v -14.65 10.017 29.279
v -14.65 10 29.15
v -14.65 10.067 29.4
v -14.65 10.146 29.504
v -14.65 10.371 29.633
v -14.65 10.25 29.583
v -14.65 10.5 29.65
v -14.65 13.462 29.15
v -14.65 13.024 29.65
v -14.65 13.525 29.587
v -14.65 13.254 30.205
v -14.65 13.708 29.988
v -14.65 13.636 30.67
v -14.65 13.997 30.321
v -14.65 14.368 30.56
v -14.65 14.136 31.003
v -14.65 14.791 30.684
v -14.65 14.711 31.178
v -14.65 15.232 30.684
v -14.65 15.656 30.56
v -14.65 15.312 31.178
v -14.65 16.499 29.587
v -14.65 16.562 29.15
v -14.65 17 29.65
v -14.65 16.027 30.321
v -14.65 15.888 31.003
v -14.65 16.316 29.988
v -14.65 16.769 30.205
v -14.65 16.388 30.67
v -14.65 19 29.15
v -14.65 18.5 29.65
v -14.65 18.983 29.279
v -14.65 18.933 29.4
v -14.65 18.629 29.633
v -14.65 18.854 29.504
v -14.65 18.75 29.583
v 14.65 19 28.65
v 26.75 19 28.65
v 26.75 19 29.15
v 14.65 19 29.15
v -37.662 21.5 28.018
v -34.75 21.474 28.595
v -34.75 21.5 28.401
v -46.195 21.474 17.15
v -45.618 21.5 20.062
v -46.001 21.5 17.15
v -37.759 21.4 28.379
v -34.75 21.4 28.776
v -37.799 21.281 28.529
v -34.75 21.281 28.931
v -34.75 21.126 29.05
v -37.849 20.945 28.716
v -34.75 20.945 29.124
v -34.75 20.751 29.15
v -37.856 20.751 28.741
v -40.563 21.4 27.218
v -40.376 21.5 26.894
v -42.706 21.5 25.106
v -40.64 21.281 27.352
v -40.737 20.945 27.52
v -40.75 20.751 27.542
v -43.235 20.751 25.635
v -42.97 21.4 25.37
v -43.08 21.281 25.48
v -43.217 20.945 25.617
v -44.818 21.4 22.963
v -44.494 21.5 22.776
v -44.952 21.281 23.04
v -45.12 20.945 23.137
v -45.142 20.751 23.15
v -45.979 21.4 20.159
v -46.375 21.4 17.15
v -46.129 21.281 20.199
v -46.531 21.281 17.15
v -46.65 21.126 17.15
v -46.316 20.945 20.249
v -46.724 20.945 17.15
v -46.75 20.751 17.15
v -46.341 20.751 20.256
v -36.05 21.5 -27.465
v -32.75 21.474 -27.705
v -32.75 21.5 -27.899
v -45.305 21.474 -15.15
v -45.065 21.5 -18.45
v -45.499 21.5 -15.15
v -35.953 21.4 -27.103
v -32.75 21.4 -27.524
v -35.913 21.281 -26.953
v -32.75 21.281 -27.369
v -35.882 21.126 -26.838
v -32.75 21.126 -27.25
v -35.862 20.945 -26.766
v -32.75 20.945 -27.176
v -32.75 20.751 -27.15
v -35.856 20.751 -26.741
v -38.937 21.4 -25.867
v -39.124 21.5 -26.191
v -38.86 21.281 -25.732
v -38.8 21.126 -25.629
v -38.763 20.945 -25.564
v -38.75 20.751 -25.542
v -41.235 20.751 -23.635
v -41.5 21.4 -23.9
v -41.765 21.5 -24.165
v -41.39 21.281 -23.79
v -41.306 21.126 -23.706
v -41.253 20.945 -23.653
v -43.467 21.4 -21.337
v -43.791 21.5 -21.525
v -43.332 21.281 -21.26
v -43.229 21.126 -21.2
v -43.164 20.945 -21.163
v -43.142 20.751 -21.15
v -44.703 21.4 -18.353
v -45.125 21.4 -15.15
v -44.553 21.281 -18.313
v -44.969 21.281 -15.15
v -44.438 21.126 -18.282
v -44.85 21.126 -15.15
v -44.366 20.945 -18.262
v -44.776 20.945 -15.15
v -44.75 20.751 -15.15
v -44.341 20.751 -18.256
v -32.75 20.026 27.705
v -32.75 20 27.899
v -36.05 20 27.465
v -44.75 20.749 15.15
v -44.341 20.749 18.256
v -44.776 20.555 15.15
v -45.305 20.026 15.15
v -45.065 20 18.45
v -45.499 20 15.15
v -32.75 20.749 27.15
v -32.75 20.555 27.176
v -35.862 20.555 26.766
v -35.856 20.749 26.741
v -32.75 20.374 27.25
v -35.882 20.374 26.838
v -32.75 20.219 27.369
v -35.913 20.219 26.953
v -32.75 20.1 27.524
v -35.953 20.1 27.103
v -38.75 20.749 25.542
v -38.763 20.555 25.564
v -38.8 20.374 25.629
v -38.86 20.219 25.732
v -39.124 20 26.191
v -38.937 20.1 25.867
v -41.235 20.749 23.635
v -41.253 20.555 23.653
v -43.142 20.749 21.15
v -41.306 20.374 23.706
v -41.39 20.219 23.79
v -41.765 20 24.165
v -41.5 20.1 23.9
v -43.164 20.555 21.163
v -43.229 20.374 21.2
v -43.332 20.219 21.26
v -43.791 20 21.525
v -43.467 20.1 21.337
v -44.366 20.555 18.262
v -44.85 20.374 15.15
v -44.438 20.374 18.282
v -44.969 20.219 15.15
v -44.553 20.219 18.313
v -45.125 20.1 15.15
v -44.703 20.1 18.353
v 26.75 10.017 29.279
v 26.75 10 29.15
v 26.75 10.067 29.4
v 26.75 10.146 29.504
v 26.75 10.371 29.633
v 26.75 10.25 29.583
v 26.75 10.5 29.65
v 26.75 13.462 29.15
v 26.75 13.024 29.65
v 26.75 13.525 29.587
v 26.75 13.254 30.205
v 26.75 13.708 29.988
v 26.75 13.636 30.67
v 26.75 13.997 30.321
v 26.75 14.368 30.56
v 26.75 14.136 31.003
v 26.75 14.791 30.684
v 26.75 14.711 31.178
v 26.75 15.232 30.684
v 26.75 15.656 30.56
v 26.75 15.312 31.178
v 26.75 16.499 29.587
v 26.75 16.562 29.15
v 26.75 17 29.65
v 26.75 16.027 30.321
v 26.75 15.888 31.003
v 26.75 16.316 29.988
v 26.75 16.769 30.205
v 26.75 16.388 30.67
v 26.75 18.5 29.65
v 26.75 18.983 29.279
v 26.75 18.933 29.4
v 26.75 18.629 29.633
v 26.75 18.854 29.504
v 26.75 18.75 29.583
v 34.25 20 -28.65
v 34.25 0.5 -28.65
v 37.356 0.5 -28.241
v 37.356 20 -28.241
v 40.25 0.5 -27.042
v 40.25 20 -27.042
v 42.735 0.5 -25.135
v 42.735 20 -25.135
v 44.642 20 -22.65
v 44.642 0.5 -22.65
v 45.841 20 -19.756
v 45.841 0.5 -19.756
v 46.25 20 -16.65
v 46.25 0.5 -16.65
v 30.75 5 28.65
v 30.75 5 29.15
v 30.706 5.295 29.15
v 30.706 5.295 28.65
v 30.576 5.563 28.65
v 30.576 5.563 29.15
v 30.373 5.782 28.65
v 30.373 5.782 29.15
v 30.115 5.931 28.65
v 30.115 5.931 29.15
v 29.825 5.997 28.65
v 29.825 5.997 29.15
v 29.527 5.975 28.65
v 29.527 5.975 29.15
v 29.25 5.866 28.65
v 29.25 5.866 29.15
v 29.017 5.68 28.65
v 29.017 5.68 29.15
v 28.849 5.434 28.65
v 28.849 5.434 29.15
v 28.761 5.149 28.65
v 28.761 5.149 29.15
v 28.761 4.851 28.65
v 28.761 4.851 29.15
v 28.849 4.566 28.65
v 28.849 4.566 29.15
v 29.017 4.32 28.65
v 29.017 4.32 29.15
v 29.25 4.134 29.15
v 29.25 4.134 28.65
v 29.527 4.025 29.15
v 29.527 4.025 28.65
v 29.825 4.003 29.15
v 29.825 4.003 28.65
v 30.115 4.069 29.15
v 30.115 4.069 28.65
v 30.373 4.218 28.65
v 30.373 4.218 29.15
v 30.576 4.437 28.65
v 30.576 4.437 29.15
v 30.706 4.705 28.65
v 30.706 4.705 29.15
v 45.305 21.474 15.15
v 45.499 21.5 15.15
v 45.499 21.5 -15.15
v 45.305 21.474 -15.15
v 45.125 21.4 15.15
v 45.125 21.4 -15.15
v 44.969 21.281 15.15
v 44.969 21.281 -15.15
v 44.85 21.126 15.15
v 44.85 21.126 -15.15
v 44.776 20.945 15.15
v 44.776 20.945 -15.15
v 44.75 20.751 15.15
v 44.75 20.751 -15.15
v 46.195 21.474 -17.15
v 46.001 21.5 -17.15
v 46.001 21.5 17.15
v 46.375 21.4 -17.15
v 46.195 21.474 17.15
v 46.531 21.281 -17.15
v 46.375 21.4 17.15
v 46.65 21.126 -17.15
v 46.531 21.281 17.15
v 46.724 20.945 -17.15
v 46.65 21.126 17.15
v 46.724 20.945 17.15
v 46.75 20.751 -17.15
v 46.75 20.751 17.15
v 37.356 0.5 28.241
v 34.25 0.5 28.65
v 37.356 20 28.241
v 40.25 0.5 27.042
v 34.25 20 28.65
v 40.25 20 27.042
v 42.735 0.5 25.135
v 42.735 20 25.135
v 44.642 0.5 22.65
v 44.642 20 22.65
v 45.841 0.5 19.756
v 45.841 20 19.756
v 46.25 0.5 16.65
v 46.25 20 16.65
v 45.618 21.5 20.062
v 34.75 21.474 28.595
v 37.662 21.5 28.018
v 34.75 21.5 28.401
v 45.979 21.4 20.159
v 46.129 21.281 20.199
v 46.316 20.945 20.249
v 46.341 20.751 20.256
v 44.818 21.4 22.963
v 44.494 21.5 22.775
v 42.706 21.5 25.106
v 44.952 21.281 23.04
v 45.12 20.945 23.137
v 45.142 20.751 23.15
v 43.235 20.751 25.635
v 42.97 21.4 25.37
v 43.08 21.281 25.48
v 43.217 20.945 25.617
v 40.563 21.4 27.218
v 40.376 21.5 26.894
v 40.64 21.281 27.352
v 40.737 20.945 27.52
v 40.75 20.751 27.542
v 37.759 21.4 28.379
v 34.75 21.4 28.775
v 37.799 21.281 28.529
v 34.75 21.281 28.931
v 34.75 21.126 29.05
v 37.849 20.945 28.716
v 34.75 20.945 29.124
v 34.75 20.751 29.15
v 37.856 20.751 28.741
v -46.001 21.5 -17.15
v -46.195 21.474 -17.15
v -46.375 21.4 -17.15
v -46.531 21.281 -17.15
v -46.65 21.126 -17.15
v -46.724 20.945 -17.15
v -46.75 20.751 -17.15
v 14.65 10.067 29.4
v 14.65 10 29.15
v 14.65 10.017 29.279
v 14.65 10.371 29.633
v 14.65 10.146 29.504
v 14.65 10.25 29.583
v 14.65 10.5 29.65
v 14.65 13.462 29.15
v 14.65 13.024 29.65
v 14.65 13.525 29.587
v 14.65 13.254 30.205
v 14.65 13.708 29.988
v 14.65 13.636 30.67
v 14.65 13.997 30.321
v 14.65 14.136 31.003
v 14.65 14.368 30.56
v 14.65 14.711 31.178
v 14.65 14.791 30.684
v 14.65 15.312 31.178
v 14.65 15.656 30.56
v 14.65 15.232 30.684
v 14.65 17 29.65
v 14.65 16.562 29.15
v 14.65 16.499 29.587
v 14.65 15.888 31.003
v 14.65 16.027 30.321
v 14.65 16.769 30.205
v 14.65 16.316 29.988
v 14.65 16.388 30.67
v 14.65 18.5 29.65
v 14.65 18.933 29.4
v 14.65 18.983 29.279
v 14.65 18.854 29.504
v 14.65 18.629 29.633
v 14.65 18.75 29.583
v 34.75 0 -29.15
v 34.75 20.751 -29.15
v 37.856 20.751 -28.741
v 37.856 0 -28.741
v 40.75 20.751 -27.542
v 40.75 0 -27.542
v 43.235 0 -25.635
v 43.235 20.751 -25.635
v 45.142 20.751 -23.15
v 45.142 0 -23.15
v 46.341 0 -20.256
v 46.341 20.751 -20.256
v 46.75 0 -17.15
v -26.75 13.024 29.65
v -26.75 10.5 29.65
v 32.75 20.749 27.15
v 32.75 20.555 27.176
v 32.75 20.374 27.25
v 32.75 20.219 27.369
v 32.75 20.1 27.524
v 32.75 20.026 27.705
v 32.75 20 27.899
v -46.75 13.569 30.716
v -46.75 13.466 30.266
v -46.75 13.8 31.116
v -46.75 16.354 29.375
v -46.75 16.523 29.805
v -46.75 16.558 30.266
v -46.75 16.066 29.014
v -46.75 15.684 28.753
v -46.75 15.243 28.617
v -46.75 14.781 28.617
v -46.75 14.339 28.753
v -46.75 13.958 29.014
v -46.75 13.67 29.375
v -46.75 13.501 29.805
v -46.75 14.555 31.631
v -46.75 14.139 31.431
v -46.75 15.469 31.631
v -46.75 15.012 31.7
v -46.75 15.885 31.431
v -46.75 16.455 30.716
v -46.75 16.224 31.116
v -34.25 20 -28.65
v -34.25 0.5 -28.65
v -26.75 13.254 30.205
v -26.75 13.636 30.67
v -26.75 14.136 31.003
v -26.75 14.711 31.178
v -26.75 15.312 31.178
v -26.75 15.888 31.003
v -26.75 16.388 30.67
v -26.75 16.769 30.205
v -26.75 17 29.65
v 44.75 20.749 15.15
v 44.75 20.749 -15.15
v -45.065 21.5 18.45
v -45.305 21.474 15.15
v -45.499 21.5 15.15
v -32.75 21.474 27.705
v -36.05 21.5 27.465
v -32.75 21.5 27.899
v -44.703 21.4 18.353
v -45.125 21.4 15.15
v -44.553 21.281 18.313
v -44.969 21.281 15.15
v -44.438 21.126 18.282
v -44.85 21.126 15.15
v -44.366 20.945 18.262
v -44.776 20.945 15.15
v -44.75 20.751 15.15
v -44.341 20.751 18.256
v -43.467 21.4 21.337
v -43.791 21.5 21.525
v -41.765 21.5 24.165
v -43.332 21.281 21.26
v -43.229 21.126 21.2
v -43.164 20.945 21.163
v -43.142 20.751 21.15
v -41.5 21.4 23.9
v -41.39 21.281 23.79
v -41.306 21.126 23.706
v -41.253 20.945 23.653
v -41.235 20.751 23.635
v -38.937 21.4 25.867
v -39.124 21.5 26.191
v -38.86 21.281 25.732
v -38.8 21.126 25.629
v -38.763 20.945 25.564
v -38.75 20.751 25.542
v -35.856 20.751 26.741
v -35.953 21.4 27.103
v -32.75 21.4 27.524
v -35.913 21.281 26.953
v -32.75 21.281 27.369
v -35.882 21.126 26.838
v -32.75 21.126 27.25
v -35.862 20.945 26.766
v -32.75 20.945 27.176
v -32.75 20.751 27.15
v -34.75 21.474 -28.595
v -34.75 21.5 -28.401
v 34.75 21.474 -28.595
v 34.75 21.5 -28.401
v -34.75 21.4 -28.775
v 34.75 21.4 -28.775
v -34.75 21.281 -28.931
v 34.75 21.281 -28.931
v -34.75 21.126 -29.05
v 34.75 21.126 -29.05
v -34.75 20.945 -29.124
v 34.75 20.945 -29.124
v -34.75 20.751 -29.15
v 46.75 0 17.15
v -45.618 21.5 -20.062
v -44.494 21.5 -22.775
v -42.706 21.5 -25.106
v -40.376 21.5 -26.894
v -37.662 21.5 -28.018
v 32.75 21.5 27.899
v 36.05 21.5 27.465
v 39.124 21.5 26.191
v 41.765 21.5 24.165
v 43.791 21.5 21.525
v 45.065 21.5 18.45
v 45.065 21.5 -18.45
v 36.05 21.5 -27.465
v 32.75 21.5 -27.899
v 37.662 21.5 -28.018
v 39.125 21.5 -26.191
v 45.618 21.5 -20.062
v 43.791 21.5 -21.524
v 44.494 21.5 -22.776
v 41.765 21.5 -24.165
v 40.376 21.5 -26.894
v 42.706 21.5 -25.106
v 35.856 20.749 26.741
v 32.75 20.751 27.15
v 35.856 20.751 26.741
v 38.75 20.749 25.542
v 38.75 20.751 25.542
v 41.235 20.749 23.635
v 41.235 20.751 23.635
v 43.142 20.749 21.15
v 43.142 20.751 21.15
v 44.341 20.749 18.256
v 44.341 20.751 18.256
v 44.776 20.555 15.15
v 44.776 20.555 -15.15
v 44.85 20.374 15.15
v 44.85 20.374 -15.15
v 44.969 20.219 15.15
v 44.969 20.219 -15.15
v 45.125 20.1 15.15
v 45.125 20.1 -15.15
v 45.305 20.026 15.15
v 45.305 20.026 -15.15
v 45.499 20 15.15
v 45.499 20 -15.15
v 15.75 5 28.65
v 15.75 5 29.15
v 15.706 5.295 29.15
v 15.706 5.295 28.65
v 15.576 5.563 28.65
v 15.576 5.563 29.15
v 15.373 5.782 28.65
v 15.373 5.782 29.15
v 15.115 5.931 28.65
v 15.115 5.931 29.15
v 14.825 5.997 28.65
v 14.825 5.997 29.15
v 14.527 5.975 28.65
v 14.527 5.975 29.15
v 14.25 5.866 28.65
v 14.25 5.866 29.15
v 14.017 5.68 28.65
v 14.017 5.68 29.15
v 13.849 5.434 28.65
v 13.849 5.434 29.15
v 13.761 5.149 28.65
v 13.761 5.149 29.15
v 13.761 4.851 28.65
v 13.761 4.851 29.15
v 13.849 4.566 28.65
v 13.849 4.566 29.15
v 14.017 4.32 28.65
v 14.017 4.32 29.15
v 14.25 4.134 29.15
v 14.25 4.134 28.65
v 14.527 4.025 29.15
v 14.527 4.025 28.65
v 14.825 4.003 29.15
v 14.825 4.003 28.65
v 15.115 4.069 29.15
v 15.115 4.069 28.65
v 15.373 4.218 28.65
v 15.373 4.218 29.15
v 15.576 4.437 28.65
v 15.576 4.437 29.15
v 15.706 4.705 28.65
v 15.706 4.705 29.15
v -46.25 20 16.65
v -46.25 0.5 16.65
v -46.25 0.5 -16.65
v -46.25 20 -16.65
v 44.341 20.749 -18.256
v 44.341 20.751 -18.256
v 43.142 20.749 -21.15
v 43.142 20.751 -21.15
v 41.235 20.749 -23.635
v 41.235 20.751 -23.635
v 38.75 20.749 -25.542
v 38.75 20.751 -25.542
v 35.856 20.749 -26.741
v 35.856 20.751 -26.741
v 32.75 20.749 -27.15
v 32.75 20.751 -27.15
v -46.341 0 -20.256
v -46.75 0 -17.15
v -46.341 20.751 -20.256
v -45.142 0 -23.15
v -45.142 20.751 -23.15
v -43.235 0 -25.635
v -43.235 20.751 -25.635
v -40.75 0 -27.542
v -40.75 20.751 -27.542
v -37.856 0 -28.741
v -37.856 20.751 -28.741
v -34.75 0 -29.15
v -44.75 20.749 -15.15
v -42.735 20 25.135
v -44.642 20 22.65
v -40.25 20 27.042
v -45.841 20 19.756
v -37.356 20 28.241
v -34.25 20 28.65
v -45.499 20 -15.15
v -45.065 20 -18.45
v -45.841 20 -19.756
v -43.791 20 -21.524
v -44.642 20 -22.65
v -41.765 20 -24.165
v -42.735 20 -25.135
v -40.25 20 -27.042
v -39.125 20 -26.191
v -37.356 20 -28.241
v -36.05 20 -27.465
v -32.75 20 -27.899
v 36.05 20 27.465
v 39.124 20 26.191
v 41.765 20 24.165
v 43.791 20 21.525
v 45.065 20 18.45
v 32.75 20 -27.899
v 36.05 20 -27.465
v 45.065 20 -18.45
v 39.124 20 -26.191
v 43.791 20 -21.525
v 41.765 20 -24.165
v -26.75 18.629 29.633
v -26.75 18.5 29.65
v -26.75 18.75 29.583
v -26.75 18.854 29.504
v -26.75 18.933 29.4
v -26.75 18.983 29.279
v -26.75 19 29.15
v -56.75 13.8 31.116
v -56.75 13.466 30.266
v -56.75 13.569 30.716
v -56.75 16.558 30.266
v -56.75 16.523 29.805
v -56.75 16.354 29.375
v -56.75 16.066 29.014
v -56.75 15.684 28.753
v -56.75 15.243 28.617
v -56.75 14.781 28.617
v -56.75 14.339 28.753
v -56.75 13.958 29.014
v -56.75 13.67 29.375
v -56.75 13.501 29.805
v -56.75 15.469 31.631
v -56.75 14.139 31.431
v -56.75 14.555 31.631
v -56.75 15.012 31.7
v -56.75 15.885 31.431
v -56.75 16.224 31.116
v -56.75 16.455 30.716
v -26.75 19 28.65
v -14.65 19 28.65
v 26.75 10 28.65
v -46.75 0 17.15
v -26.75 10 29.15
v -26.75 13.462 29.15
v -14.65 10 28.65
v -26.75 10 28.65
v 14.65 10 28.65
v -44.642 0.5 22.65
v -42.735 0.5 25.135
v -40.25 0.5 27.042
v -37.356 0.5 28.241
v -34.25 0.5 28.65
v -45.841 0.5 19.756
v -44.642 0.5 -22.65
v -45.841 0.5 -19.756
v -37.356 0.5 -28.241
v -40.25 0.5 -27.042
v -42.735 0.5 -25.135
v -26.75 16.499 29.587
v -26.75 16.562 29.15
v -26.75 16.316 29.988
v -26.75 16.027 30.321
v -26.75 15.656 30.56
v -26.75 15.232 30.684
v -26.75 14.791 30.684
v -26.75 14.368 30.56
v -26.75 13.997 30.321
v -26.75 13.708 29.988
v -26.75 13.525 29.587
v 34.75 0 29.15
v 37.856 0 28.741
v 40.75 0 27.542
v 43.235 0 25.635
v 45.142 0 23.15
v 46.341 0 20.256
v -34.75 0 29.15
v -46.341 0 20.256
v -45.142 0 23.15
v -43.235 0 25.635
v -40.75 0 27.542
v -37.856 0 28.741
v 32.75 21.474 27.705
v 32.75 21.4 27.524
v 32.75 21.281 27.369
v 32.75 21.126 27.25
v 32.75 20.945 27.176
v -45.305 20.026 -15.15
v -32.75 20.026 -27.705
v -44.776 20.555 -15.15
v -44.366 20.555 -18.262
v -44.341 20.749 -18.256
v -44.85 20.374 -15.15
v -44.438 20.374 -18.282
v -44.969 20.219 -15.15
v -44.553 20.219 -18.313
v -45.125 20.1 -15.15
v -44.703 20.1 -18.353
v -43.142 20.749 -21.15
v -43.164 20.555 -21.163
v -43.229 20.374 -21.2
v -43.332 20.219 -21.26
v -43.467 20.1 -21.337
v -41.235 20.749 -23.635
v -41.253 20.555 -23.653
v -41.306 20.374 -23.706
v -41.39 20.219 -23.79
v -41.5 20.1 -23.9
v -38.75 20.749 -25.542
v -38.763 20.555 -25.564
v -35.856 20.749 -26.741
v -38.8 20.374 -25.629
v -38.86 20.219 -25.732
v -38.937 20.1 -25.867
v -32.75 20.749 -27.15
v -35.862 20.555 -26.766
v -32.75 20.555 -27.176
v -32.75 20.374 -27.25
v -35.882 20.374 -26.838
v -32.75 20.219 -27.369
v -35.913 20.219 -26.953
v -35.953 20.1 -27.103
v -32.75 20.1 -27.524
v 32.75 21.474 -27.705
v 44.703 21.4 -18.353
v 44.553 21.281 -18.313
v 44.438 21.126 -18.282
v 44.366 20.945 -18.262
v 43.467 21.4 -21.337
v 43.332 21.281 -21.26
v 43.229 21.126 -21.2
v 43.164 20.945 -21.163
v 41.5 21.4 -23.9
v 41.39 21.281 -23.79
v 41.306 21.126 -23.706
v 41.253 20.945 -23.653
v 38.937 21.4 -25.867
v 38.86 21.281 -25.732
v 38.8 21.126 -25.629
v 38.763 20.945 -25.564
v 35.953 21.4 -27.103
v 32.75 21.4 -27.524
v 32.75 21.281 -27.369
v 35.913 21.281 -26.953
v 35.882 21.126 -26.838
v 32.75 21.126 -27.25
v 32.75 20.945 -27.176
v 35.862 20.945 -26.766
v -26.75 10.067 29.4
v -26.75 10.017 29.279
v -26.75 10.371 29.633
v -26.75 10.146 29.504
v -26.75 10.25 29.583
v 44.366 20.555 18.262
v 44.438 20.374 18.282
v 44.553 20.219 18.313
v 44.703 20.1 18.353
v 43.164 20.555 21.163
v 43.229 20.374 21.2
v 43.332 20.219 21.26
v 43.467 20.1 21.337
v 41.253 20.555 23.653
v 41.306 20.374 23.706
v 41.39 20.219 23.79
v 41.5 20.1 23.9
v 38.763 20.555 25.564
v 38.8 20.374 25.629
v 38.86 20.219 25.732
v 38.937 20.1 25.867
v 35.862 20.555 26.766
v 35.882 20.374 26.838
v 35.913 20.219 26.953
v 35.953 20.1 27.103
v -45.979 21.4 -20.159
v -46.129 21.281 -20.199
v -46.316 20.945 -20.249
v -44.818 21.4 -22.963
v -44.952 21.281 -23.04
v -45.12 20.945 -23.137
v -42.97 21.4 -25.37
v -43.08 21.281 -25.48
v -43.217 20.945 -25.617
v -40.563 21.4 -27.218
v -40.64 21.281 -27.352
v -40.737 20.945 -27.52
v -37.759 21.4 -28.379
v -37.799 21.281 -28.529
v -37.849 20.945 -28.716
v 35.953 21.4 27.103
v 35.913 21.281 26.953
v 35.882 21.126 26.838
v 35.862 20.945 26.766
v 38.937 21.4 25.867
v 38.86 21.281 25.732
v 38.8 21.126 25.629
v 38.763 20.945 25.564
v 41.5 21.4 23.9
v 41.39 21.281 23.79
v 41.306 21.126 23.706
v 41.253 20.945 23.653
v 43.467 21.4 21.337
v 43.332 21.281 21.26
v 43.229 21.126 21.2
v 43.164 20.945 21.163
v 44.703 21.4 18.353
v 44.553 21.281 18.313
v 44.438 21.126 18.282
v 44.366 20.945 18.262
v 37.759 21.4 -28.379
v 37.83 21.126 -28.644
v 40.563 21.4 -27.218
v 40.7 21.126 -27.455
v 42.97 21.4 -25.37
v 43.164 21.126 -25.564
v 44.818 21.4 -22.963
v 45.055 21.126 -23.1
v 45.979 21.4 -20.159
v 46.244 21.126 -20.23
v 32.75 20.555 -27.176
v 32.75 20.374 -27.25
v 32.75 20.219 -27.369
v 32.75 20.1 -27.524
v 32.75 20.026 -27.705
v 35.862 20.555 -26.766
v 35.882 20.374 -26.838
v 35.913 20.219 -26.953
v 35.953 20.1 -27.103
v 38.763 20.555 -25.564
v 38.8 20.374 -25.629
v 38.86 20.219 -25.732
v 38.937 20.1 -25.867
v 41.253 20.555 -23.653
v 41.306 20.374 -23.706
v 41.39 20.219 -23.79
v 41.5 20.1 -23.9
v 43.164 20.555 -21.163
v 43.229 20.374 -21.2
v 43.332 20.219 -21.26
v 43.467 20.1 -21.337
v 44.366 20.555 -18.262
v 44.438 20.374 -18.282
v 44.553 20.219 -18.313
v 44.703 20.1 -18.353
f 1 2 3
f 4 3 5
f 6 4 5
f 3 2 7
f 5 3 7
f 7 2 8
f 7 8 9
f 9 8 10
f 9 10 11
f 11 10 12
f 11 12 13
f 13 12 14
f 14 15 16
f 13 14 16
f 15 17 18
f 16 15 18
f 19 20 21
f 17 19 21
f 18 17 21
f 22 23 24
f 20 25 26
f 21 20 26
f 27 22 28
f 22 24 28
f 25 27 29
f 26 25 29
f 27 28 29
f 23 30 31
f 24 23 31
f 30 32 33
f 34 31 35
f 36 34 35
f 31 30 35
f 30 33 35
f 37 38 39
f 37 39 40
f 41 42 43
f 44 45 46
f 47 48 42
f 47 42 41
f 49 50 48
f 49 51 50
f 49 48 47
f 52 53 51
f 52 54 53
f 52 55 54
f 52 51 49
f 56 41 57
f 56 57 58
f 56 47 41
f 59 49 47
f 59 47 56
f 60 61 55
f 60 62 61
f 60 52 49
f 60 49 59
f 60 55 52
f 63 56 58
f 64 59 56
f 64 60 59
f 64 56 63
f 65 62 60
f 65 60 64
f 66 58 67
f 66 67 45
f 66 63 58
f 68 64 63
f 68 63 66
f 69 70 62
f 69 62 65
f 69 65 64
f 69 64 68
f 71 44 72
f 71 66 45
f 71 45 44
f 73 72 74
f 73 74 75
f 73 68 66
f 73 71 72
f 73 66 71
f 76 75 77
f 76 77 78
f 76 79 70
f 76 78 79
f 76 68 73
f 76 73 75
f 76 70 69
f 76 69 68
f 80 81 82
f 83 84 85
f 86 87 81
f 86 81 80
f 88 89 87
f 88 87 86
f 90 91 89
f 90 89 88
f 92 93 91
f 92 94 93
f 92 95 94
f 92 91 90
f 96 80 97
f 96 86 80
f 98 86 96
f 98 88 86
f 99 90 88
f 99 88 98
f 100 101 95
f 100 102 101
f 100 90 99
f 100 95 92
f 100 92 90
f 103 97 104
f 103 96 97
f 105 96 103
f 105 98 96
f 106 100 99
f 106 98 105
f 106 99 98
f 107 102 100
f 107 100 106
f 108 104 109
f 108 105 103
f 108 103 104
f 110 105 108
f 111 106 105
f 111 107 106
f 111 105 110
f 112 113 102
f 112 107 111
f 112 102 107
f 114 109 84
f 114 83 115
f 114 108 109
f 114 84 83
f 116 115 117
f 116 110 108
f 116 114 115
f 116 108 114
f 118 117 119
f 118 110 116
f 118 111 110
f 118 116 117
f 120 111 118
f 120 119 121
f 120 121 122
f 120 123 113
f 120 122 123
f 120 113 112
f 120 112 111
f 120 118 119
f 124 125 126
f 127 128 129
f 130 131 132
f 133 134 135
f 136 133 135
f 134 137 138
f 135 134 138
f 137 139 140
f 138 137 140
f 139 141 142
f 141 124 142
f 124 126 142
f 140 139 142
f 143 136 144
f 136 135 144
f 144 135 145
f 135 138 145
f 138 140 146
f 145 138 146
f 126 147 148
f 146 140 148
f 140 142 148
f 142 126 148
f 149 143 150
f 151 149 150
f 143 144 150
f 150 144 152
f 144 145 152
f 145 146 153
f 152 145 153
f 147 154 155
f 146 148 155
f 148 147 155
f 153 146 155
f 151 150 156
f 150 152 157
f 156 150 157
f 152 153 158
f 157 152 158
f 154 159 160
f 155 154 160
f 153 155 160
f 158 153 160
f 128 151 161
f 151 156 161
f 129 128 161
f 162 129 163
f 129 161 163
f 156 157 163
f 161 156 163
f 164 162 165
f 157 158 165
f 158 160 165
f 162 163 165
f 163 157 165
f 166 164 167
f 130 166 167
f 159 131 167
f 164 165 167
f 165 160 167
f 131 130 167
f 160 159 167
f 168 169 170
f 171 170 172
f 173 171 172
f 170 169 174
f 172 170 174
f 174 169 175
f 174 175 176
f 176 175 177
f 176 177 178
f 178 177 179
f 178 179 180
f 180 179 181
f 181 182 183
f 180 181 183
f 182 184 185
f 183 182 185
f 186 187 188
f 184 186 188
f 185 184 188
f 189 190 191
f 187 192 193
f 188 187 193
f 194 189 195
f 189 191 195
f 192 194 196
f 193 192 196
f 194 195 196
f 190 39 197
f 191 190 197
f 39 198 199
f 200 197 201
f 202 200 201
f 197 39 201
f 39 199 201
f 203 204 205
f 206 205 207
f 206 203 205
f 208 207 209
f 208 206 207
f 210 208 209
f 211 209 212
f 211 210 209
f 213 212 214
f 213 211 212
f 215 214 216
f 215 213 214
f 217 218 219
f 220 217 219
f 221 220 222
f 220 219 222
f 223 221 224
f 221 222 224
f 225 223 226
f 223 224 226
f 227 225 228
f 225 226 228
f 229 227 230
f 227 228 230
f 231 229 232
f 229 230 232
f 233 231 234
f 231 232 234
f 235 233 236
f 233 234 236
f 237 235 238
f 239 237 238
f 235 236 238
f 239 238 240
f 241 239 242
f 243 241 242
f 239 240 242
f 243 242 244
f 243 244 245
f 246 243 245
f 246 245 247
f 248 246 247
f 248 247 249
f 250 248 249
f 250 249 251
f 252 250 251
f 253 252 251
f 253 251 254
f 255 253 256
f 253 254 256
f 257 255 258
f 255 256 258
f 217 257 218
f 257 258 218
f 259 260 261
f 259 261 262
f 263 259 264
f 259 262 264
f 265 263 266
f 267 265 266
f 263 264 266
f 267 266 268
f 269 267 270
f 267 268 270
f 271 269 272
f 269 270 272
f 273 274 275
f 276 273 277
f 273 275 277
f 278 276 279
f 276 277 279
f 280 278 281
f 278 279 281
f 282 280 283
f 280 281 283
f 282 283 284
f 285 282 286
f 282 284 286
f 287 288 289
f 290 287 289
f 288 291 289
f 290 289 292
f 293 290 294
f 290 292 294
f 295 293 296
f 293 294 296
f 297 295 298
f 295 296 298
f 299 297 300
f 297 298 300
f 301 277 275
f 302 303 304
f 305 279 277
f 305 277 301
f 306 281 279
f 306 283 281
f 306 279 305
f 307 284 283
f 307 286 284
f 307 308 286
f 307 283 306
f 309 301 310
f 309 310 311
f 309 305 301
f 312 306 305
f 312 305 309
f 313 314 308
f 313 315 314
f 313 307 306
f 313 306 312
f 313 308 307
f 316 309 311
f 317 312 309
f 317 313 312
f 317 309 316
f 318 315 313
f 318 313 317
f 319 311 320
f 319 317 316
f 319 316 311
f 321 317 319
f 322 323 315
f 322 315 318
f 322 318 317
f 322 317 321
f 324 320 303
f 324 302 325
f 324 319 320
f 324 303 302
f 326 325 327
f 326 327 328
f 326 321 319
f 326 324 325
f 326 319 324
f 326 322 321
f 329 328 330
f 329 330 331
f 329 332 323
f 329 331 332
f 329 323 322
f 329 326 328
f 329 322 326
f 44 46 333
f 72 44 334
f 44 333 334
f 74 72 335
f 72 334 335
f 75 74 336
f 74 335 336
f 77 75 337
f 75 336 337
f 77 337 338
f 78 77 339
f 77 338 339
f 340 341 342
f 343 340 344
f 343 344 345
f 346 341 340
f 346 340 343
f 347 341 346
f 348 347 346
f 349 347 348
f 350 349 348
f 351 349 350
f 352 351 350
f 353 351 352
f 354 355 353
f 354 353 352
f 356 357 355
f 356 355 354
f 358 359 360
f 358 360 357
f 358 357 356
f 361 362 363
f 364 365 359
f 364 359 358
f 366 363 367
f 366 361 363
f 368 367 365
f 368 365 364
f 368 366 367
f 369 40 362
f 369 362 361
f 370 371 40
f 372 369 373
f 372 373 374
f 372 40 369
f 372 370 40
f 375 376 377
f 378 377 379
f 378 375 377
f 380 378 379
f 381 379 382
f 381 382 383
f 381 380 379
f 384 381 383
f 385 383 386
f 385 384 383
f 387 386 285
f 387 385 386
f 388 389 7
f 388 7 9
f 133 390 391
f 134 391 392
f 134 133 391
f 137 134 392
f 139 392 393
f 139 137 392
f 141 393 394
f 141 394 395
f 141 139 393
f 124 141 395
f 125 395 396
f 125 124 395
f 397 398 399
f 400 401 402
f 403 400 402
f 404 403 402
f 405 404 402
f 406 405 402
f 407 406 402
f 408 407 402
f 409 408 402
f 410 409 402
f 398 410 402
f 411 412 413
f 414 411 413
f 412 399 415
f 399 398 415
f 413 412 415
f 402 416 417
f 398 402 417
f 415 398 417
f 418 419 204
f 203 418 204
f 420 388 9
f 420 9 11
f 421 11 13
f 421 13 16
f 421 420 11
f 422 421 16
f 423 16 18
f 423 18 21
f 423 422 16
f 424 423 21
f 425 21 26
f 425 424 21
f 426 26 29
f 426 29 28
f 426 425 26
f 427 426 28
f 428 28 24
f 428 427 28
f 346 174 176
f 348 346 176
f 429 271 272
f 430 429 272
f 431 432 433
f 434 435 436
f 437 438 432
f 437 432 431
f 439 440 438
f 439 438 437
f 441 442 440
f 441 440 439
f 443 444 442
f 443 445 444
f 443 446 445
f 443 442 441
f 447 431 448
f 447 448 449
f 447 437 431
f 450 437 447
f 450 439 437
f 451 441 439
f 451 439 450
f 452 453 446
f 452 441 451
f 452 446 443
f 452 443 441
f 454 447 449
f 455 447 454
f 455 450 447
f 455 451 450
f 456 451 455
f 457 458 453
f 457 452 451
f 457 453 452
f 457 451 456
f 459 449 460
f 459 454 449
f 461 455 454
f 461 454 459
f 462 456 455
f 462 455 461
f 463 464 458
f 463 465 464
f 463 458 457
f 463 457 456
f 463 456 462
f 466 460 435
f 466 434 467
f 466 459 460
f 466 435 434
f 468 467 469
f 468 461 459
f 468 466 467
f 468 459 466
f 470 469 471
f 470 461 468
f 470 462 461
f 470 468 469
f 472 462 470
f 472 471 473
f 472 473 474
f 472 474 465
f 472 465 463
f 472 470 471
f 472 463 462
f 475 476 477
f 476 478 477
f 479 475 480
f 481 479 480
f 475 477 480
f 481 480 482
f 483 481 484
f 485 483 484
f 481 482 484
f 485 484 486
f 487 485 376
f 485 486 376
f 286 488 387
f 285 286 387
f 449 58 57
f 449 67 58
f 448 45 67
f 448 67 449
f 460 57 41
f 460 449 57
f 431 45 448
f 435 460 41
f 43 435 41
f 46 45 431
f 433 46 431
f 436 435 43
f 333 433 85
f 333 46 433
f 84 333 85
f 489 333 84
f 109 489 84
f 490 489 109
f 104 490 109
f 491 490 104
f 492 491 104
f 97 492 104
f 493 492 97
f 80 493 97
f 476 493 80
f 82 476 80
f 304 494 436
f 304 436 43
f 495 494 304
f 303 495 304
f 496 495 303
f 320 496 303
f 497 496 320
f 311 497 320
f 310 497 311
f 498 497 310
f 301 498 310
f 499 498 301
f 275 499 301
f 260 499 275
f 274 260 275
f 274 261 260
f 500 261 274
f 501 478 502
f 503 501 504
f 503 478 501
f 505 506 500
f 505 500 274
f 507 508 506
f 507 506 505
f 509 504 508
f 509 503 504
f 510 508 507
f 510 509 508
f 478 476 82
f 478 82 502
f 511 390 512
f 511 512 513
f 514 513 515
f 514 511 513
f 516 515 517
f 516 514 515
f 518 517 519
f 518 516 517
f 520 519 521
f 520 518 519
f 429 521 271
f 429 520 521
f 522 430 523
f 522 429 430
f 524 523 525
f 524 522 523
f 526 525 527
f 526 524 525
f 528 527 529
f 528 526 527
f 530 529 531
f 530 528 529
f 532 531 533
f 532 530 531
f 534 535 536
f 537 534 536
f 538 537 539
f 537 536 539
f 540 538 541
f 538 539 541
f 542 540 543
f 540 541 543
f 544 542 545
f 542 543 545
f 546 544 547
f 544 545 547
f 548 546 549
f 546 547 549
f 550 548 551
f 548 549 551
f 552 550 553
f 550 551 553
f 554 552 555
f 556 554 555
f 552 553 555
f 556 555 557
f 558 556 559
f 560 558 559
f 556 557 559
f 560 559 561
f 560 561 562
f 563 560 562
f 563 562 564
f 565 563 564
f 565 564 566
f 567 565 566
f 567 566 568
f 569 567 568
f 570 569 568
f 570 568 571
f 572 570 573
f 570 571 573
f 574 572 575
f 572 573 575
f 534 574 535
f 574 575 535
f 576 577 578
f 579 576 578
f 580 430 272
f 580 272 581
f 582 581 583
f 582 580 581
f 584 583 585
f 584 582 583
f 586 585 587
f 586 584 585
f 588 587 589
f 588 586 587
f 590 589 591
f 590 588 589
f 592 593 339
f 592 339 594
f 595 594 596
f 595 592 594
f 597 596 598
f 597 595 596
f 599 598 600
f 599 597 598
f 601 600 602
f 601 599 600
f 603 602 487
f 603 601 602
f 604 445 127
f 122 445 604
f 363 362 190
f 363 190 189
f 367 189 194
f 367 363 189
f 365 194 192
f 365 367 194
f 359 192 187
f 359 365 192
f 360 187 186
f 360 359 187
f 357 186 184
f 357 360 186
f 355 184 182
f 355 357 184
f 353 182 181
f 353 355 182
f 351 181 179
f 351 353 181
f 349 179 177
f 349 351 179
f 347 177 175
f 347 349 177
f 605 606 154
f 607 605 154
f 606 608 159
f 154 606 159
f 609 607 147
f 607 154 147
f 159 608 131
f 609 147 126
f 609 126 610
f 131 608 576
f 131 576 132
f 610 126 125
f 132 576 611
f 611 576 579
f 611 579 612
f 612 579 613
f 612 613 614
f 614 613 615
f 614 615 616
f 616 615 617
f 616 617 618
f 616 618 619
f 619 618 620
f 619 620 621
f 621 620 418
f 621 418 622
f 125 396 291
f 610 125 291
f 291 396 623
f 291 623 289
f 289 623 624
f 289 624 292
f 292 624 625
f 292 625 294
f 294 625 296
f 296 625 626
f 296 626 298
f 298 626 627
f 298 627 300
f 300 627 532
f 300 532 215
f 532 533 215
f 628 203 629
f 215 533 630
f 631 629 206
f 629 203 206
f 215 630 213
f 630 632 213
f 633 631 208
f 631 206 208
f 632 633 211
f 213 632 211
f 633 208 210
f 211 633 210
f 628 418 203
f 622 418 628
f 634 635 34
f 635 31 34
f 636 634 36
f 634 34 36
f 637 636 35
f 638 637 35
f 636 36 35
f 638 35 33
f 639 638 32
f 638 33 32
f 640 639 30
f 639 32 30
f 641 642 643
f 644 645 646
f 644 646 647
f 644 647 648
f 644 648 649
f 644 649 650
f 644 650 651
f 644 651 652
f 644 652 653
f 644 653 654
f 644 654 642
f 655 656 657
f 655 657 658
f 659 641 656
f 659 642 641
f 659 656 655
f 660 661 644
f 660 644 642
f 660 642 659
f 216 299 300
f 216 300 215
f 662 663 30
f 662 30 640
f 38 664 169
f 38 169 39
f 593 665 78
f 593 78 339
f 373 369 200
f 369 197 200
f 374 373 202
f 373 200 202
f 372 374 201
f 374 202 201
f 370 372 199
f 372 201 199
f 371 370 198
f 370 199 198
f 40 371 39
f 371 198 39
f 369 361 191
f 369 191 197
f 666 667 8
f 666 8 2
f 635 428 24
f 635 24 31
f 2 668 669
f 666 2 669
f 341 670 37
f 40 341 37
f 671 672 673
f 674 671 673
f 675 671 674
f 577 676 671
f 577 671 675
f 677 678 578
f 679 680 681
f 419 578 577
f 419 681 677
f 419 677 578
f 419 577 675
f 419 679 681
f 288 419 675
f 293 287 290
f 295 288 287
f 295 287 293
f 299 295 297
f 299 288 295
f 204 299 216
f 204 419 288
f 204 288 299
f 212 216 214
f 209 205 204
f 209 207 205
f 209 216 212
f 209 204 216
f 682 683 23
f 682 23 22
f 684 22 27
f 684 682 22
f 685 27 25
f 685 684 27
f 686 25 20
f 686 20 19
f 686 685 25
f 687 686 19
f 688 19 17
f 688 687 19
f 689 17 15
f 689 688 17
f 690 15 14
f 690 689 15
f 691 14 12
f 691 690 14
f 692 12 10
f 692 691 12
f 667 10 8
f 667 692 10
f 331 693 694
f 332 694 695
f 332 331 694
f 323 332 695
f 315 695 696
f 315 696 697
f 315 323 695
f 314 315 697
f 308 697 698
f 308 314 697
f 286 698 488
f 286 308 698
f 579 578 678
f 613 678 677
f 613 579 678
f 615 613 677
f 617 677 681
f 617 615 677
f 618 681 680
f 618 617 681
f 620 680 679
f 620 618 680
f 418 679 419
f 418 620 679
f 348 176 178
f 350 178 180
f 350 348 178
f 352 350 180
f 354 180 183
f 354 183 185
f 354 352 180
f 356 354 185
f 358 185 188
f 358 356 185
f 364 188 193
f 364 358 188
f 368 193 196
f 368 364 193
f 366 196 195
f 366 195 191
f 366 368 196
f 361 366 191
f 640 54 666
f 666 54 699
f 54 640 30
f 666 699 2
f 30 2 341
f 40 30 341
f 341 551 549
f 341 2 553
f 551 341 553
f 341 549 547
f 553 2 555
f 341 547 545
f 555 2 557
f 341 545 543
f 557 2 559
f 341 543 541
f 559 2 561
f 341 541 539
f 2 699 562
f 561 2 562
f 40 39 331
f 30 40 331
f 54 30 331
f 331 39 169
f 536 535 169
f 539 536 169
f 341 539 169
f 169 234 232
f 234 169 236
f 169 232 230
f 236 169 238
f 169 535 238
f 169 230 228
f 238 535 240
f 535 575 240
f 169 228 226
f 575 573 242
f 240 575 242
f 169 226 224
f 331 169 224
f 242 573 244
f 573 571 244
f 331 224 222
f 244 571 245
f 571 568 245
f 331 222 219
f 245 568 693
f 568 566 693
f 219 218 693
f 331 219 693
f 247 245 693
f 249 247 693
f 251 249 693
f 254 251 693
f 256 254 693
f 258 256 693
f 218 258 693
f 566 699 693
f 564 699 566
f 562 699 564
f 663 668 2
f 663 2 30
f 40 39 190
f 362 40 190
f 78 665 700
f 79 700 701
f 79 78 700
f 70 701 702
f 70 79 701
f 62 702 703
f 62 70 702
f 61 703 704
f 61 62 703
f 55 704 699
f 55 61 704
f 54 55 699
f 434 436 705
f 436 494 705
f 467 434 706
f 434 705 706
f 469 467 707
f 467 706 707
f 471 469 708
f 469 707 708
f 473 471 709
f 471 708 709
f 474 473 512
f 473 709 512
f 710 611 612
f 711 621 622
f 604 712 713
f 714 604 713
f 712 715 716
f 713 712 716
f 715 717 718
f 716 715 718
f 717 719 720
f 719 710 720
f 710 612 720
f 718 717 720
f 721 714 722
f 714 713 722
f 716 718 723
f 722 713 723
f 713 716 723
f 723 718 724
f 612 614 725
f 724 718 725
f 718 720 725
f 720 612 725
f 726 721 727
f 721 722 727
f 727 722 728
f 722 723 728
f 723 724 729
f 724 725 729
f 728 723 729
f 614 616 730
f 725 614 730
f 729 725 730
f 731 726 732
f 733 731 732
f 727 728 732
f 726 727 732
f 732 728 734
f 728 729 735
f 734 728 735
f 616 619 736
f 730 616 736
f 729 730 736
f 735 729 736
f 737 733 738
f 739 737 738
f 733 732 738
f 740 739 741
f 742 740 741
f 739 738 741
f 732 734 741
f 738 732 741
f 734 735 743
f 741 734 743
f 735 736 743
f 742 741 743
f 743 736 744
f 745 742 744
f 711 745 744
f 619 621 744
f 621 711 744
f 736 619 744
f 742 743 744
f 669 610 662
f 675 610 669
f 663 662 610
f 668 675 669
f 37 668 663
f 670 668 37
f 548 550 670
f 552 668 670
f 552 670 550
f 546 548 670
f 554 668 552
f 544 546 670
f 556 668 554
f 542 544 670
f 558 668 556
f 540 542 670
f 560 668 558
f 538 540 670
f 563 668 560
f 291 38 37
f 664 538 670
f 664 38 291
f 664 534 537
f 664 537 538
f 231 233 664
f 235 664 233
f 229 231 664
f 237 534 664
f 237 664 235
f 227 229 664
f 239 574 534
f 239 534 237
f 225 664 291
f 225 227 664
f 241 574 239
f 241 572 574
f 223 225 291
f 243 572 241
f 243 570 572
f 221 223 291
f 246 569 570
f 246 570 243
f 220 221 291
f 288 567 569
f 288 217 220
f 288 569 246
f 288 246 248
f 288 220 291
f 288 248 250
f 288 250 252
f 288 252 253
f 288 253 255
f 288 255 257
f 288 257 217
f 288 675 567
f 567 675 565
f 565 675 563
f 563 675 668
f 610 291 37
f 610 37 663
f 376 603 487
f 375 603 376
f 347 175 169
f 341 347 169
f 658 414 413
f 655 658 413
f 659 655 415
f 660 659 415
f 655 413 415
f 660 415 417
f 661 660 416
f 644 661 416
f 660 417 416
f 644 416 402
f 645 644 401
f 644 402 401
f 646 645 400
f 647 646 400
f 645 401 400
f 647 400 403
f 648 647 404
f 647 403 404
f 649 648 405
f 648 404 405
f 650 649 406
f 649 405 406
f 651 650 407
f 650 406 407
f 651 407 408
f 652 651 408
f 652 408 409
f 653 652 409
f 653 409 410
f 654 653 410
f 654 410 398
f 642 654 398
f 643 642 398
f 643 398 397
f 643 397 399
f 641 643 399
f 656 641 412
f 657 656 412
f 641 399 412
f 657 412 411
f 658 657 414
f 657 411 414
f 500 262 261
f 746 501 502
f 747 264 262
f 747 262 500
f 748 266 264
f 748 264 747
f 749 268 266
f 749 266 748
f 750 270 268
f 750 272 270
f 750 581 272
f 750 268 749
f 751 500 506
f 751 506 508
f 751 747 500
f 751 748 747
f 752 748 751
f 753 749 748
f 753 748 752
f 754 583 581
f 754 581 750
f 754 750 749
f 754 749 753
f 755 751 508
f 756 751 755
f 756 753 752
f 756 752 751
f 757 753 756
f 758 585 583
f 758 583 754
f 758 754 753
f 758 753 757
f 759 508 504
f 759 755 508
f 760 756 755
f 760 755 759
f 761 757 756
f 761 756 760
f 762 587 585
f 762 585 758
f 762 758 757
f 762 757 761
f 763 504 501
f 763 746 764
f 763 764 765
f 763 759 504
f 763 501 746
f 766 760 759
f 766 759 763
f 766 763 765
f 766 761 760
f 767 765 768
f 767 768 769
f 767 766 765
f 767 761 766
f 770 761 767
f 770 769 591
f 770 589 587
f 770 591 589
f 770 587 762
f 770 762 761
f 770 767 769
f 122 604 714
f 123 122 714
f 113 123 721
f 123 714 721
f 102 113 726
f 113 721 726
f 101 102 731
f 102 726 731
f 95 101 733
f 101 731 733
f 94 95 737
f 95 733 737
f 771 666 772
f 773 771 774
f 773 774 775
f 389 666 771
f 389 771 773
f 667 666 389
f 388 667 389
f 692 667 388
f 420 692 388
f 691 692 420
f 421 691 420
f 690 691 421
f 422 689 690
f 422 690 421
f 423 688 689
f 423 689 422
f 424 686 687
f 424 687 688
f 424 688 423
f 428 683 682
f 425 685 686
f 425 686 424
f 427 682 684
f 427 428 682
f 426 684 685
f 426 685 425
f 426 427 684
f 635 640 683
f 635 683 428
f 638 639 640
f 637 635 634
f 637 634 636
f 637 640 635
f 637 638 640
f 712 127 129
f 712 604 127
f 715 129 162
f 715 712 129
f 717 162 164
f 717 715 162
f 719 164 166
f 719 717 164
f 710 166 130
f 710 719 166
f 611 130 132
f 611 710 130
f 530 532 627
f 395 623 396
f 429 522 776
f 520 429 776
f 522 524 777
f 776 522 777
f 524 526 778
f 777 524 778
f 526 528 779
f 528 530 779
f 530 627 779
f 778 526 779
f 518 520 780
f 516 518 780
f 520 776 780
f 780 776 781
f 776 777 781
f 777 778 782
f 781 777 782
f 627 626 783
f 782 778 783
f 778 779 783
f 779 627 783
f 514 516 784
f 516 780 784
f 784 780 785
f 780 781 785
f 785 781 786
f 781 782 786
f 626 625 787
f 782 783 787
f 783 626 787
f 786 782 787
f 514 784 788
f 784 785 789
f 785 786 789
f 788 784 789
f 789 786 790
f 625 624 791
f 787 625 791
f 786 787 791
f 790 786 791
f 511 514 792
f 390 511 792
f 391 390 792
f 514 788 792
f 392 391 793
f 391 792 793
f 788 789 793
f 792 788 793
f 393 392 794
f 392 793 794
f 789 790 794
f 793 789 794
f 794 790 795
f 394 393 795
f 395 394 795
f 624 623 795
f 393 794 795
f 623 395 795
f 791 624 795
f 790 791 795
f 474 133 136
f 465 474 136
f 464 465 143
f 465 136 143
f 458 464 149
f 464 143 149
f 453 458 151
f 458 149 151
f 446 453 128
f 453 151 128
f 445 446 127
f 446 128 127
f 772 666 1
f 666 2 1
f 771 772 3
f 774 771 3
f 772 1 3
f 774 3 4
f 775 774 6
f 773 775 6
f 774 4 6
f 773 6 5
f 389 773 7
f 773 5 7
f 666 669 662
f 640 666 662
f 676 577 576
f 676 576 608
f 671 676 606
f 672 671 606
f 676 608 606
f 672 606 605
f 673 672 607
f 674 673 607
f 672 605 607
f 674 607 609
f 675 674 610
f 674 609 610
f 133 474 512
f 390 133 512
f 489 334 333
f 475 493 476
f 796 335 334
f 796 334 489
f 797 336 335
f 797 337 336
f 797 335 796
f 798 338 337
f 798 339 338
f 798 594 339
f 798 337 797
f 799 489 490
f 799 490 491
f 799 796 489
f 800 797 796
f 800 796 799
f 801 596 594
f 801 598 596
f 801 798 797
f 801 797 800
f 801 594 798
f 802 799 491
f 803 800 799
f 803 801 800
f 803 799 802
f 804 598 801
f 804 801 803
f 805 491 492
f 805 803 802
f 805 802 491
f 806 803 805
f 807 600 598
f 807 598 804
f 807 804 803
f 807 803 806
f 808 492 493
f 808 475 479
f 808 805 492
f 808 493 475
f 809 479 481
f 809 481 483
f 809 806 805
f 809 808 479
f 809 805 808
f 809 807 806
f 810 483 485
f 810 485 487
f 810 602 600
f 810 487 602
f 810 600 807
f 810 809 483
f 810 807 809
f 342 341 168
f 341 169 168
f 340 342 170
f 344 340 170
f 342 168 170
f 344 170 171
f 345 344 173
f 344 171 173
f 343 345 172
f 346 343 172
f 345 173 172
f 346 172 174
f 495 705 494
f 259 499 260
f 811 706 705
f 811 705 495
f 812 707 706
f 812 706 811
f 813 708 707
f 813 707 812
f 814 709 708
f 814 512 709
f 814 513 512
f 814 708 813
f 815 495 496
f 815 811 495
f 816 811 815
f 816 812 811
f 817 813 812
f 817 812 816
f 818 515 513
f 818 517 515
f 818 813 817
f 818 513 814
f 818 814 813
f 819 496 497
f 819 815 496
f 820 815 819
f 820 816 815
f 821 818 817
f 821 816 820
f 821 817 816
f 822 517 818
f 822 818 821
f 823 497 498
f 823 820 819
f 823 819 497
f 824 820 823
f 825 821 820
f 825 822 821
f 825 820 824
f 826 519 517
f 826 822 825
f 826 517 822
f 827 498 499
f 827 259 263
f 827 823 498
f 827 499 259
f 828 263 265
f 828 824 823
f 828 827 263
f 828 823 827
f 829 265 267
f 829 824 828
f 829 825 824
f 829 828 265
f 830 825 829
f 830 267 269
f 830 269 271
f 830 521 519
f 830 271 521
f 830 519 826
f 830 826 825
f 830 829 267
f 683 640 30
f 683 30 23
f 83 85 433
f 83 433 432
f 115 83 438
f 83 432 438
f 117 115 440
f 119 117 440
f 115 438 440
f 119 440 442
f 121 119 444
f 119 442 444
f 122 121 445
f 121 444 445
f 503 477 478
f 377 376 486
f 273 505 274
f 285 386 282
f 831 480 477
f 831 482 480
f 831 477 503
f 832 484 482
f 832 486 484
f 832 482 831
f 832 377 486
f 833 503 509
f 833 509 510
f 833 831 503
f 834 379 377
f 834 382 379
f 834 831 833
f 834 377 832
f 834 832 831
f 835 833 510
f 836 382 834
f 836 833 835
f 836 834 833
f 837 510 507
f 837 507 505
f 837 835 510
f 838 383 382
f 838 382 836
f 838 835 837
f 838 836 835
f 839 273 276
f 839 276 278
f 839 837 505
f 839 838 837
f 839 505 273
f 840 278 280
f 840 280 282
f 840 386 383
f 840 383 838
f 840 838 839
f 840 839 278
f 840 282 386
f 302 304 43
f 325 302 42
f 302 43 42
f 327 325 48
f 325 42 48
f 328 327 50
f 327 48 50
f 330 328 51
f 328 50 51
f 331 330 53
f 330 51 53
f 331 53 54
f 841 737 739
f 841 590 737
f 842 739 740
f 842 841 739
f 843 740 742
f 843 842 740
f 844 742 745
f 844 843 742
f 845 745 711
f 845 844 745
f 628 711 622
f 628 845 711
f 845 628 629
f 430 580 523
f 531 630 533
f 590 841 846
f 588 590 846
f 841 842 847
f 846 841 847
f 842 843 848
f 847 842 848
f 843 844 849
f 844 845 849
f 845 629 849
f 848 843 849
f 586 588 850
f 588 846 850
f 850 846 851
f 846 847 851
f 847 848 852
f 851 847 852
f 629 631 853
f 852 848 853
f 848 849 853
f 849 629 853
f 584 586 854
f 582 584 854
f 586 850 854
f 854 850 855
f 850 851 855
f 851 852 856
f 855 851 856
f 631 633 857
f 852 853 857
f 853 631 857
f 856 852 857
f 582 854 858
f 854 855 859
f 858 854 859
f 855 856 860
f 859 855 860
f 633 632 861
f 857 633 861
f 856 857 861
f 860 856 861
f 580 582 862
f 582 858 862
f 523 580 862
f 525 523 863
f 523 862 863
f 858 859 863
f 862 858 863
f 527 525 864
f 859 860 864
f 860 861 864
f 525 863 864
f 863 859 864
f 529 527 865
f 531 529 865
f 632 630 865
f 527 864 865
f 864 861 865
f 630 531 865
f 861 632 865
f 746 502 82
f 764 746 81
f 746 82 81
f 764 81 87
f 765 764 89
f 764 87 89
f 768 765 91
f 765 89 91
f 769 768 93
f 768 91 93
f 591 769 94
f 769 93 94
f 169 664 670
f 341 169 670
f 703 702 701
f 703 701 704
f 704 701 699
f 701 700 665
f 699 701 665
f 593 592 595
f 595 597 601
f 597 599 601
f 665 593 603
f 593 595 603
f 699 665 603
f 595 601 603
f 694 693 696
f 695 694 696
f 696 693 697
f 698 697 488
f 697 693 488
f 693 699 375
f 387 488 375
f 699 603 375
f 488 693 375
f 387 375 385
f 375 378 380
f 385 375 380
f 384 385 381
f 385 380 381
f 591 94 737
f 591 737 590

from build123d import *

# Parameters (mm, degrees)
SKETCH1_W           = 93.5
SKETCH1_H           = 58.3
BOSS_EXTRUDE1_DEPTH = 0.5
SKETCH2_W           = 93.5
SKETCH2_H           = 58.3
SKETCH2_W_2         = 92.5
SKETCH2_H_2         = 57.3
BOSS_EXTRUDE2_DEPTH = 21
SKETCH3_W           = 92.5
SKETCH3_H           = 57.3
SKETCH3_W_2         = 89.5
SKETCH3_H_2         = 54.3
BOSS_EXTRUDE3_DEPTH = 1.5
FILLET2_R           = 12
FILLET3_R           = 0.749
SKETCH4_W           = 12.1
SKETCH4_H           = 9
CUT_EXTRUDE1_DEPTH  = 0.5
BOSS_EXTRUDE4_START = -20
BOSS_EXTRUDE4_DEPTH = 12.1
BOSS_EXTRUDE5_START = -61.4
BOSS_EXTRUDE5_DEPTH = 12.1
FILLET4_R           = 0.5
FILLET5_R           = 0.5
SKETCH6_R           = 1.55
BOSS_EXTRUDE6_DEPTH = 10
SKETCH7_R           = 1
CUT_EXTRUDE2_DEPTH  = 0.5


with BuildPart() as part:
    # Sketch1 → Boss-Extrude1 (new body)
    with BuildSketch(Plane(origin=(0, 0, 0), x_dir=(1, 0, 0), z_dir=(0, 1, 0))):
        Rectangle(SKETCH1_W, SKETCH1_H)
    extrude(amount=BOSS_EXTRUDE1_DEPTH)

    # Sketch2 → Boss-Extrude2 (add)
    with BuildSketch(Plane(origin=(0, 0.5, 0), x_dir=(1, 0, 0), z_dir=(0, 1, 0))):
        Rectangle(SKETCH2_W, SKETCH2_H)
        Rectangle(SKETCH2_W_2, SKETCH2_H_2, mode=Mode.SUBTRACT)
    extrude(amount=BOSS_EXTRUDE2_DEPTH)

    # Sketch3 → Boss-Extrude3 (add)
    with BuildSketch(Plane(origin=(0, 21.5, 0), x_dir=(1, 0, 0), z_dir=(0, 1, 0))):
        Rectangle(SKETCH3_W, SKETCH3_H)
        Rectangle(SKETCH3_W_2, SKETCH3_H_2, mode=Mode.SUBTRACT)
    extrude(amount=-BOSS_EXTRUDE3_DEPTH)

    # Fillet2
    fillet2_edges = [part.edges().sort_by_distance(p)[0] for p in [
        (46.25, 10.25, -28.65),
        (-46.25, 10.25, -28.65),
        (46.25, 10.25, 28.65),
        (-46.25, 10.25, 28.65),
        (-44.75, 20.75, -27.15),
        (44.75, 20.75, -27.15),
        (44.75, 20.75, 27.15),
        (-44.75, 20.75, 27.15),
        (-46.75, 10.75, -29.15),
        (46.75, 10.75, -29.15),
        (46.75, 10.75, 29.15),
        (-46.75, 10.75, 29.15),
    ]]
    fillet(fillet2_edges, radius=FILLET2_R)

    # Fillet3
    fillet3_edges = [part.edges().sort_by_distance(p)[0] for p in [
        (-41.235281374, 20, 23.635281374),
        (41.235281374, 21.5, 23.635281374),
        (41.235281374, 20, 23.635281374),
        (41.235281374, 21.5, -23.635281374),
        (41.235281374, 20, -23.635281374),
        (43.235281374, 21.5, -25.635281374),
        (43.235281374, 21.5, 25.635281374),
        (-43.235281374, 21.5, 25.635281374),
        (-43.235281374, 21.5, -25.635281374),
        (-46.75, 21.5, 0),
        (0, 21.5, -29.15),
        (-44.75, 21.5, 0),
        (-44.75, 20, 0),
        (0, 21.5, -27.15),
        (0, 20, -27.15),
        (0, 21.5, 29.15),
        (0, 21.5, 27.15),
        (0, 20, 27.15),
        (44.75, 21.5, 0),
        (44.75, 20, 0),
        (46.75, 21.5, 0),
        (-41.235281374, 21.5, -23.635281374),
        (-41.235281374, 20, -23.635281374),
        (-41.235281374, 21.5, 23.635281374),
    ]]
    fillet(fillet3_edges, radius=FILLET3_R)

    # Sketch4 → Cut-Extrude1 (cut)
    with BuildSketch(Plane(origin=(0, 0, 28.65), x_dir=(-1, 0, 0), z_dir=(0, 0, -1))):
        with Locations((-20.7, 14.5)):
            Rectangle(SKETCH4_W, SKETCH4_H)
        with Locations((20.7, 14.5)):
            Rectangle(SKETCH4_W, SKETCH4_H)
    extrude(amount=-CUT_EXTRUDE1_DEPTH, mode=Mode.SUBTRACT)

    # Sketch7 → Cut-Extrude2 (cut)
    with BuildSketch(Plane.XY.offset(29.15)):
        with Locations((14.75, 5)):
            Circle(SKETCH7_R)
        with Locations((29.75, 5)):
            Circle(SKETCH7_R)
    extrude(amount=-CUT_EXTRUDE2_DEPTH, mode=Mode.SUBTRACT)


with BuildPart() as body_2:
    # Sketch5 → Boss-Extrude4 (new body)
    with BuildSketch(Plane.ZY.offset(46.75).offset(BOSS_EXTRUDE4_START)):
        with BuildLine():
            Line((29.65, 17), (29.65, 19))
            Line((29.65, 19), (29.15, 19))
            Line((29.15, 19), (29.15, 16.561910465))
            ThreePointArc((29.15, 16.561910465), (30.7, 15.011910465), (29.15, 13.461910465))
            Line((29.15, 13.461910465), (29.15, 10))
            Line((29.15, 10), (29.65, 10))
            Line((29.65, 10), (29.65, 13.02382093))
            ThreePointArc((29.65, 13.02382093), (31.2, 15.011910465), (29.65, 17))
        make_face()
    extrude(amount=-BOSS_EXTRUDE4_DEPTH)

    # Fillet4
    fillet4_edges = [body_2.edges().sort_by_distance(p)[0] for p in [
        (-20.7, 10, 29.65),
        (-20.7, 19, 29.65),
    ]]
    fillet(fillet4_edges, radius=FILLET4_R - 0.0001)  # a hair under: the kernel refuses the full size


with BuildPart() as body_3:
    # Sketch5<2> → Boss-Extrude5 (new body)
    with BuildSketch(Plane.ZY.offset(46.75).offset(BOSS_EXTRUDE5_START)):
        with BuildLine():
            Line((29.65, 17), (29.65, 19))
            Line((29.65, 19), (29.15, 19))
            Line((29.15, 19), (29.15, 16.561910465))
            ThreePointArc((29.15, 16.561910465), (30.7, 15.011910465), (29.15, 13.461910465))
            Line((29.15, 13.461910465), (29.15, 10))
            Line((29.15, 10), (29.65, 10))
            Line((29.65, 10), (29.65, 13.02382093))
            ThreePointArc((29.65, 13.02382093), (31.2, 15.011910465), (29.65, 17))
        make_face()
    extrude(amount=-BOSS_EXTRUDE5_DEPTH)

    # Fillet5
    fillet5_edges = [body_3.edges().sort_by_distance(p)[0] for p in [
        (20.7, 10, 29.65),
        (20.7, 19, 29.65),
    ]]
    fillet(fillet5_edges, radius=FILLET5_R - 0.0001)  # a hair under: the kernel refuses the full size


with BuildPart() as body_4:
    # Sketch6 → Boss-Extrude6 (new body)
    with BuildSketch(Plane.ZY.offset(46.75)):
        with Locations((30.15, 15.011910465)):
            Circle(SKETCH6_R)
    extrude(amount=BOSS_EXTRUDE6_DEPTH)


solid = Compound([part.part, body_2.part, body_3.part, body_4.part])
